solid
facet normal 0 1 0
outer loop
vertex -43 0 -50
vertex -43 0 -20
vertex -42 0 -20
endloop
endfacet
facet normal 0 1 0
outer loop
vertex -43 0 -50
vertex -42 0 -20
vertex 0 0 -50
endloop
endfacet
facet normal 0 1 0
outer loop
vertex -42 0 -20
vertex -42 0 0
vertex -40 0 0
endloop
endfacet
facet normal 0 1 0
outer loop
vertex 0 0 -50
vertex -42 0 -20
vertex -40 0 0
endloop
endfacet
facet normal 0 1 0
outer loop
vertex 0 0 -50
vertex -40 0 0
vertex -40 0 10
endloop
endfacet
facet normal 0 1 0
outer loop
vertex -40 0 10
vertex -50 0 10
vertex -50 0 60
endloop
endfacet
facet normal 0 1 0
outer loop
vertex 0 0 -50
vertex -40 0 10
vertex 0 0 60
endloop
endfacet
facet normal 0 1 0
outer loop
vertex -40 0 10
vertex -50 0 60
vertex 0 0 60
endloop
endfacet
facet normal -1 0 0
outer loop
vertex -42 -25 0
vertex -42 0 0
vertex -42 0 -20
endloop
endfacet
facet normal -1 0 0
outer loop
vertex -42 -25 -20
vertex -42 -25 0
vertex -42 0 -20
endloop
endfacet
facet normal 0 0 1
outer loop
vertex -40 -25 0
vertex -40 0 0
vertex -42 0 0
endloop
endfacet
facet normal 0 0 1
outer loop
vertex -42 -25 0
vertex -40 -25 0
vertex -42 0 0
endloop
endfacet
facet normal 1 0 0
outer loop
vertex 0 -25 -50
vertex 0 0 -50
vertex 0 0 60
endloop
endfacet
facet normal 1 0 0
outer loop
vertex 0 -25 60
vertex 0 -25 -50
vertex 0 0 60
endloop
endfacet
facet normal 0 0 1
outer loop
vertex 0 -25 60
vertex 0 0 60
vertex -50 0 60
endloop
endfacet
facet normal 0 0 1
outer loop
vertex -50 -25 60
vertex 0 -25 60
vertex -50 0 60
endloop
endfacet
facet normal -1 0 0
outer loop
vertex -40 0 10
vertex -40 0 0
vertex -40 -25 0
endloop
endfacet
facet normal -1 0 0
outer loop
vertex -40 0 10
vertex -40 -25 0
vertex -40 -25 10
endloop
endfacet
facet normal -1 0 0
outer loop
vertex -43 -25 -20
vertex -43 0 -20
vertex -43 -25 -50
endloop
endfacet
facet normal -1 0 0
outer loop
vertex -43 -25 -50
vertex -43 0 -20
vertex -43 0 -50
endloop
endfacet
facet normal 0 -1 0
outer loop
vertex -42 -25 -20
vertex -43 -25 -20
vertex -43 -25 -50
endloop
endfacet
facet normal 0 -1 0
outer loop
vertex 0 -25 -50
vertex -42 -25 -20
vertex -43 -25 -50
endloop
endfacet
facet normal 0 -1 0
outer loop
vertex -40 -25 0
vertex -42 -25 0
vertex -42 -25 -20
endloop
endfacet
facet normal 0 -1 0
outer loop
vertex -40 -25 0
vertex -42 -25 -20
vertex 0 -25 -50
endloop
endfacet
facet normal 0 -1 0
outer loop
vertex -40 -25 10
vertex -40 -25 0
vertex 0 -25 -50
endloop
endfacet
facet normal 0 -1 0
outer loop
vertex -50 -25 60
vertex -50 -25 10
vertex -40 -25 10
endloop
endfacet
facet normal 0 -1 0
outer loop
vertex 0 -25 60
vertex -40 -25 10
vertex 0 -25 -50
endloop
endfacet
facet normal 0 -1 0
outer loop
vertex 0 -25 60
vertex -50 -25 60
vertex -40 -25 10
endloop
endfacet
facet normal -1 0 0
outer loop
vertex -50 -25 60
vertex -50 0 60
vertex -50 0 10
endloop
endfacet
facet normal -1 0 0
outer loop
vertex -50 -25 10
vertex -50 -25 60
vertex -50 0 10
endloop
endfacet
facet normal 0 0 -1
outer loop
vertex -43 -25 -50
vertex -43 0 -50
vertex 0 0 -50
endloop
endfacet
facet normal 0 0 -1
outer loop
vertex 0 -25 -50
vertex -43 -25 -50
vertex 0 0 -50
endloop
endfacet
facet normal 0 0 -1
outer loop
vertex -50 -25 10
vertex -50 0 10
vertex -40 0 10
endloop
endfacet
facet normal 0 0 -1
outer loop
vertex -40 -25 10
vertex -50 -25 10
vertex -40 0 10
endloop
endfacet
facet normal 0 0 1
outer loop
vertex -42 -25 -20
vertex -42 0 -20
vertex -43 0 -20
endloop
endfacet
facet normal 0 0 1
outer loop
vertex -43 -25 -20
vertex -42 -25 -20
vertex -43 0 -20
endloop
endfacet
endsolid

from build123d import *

# Parameters (mm, degrees)
F0_W     = 40
F0_H     = 10
F1_DEPTH = 25


with BuildPart() as f1:
    # F0 (on Front) → F1 (new body)
    with BuildSketch(Plane.XZ):
        Polygon((0, -20), (0, 0), (-40, 0), (-42, 0), (-42, -20), align=None)
        with Locations((-20, 5)):
            Rectangle(F0_W, F0_H)
        Polygon((-40, 10), (0, 10), (0, 60), (-50, 60), (-50, 10), align=None)
        Polygon((0, -50), (0, -20), (-42, -20), (-43, -20), (-43, -50), align=None)
    extrude(amount=F1_DEPTH)


solid = f1.part
